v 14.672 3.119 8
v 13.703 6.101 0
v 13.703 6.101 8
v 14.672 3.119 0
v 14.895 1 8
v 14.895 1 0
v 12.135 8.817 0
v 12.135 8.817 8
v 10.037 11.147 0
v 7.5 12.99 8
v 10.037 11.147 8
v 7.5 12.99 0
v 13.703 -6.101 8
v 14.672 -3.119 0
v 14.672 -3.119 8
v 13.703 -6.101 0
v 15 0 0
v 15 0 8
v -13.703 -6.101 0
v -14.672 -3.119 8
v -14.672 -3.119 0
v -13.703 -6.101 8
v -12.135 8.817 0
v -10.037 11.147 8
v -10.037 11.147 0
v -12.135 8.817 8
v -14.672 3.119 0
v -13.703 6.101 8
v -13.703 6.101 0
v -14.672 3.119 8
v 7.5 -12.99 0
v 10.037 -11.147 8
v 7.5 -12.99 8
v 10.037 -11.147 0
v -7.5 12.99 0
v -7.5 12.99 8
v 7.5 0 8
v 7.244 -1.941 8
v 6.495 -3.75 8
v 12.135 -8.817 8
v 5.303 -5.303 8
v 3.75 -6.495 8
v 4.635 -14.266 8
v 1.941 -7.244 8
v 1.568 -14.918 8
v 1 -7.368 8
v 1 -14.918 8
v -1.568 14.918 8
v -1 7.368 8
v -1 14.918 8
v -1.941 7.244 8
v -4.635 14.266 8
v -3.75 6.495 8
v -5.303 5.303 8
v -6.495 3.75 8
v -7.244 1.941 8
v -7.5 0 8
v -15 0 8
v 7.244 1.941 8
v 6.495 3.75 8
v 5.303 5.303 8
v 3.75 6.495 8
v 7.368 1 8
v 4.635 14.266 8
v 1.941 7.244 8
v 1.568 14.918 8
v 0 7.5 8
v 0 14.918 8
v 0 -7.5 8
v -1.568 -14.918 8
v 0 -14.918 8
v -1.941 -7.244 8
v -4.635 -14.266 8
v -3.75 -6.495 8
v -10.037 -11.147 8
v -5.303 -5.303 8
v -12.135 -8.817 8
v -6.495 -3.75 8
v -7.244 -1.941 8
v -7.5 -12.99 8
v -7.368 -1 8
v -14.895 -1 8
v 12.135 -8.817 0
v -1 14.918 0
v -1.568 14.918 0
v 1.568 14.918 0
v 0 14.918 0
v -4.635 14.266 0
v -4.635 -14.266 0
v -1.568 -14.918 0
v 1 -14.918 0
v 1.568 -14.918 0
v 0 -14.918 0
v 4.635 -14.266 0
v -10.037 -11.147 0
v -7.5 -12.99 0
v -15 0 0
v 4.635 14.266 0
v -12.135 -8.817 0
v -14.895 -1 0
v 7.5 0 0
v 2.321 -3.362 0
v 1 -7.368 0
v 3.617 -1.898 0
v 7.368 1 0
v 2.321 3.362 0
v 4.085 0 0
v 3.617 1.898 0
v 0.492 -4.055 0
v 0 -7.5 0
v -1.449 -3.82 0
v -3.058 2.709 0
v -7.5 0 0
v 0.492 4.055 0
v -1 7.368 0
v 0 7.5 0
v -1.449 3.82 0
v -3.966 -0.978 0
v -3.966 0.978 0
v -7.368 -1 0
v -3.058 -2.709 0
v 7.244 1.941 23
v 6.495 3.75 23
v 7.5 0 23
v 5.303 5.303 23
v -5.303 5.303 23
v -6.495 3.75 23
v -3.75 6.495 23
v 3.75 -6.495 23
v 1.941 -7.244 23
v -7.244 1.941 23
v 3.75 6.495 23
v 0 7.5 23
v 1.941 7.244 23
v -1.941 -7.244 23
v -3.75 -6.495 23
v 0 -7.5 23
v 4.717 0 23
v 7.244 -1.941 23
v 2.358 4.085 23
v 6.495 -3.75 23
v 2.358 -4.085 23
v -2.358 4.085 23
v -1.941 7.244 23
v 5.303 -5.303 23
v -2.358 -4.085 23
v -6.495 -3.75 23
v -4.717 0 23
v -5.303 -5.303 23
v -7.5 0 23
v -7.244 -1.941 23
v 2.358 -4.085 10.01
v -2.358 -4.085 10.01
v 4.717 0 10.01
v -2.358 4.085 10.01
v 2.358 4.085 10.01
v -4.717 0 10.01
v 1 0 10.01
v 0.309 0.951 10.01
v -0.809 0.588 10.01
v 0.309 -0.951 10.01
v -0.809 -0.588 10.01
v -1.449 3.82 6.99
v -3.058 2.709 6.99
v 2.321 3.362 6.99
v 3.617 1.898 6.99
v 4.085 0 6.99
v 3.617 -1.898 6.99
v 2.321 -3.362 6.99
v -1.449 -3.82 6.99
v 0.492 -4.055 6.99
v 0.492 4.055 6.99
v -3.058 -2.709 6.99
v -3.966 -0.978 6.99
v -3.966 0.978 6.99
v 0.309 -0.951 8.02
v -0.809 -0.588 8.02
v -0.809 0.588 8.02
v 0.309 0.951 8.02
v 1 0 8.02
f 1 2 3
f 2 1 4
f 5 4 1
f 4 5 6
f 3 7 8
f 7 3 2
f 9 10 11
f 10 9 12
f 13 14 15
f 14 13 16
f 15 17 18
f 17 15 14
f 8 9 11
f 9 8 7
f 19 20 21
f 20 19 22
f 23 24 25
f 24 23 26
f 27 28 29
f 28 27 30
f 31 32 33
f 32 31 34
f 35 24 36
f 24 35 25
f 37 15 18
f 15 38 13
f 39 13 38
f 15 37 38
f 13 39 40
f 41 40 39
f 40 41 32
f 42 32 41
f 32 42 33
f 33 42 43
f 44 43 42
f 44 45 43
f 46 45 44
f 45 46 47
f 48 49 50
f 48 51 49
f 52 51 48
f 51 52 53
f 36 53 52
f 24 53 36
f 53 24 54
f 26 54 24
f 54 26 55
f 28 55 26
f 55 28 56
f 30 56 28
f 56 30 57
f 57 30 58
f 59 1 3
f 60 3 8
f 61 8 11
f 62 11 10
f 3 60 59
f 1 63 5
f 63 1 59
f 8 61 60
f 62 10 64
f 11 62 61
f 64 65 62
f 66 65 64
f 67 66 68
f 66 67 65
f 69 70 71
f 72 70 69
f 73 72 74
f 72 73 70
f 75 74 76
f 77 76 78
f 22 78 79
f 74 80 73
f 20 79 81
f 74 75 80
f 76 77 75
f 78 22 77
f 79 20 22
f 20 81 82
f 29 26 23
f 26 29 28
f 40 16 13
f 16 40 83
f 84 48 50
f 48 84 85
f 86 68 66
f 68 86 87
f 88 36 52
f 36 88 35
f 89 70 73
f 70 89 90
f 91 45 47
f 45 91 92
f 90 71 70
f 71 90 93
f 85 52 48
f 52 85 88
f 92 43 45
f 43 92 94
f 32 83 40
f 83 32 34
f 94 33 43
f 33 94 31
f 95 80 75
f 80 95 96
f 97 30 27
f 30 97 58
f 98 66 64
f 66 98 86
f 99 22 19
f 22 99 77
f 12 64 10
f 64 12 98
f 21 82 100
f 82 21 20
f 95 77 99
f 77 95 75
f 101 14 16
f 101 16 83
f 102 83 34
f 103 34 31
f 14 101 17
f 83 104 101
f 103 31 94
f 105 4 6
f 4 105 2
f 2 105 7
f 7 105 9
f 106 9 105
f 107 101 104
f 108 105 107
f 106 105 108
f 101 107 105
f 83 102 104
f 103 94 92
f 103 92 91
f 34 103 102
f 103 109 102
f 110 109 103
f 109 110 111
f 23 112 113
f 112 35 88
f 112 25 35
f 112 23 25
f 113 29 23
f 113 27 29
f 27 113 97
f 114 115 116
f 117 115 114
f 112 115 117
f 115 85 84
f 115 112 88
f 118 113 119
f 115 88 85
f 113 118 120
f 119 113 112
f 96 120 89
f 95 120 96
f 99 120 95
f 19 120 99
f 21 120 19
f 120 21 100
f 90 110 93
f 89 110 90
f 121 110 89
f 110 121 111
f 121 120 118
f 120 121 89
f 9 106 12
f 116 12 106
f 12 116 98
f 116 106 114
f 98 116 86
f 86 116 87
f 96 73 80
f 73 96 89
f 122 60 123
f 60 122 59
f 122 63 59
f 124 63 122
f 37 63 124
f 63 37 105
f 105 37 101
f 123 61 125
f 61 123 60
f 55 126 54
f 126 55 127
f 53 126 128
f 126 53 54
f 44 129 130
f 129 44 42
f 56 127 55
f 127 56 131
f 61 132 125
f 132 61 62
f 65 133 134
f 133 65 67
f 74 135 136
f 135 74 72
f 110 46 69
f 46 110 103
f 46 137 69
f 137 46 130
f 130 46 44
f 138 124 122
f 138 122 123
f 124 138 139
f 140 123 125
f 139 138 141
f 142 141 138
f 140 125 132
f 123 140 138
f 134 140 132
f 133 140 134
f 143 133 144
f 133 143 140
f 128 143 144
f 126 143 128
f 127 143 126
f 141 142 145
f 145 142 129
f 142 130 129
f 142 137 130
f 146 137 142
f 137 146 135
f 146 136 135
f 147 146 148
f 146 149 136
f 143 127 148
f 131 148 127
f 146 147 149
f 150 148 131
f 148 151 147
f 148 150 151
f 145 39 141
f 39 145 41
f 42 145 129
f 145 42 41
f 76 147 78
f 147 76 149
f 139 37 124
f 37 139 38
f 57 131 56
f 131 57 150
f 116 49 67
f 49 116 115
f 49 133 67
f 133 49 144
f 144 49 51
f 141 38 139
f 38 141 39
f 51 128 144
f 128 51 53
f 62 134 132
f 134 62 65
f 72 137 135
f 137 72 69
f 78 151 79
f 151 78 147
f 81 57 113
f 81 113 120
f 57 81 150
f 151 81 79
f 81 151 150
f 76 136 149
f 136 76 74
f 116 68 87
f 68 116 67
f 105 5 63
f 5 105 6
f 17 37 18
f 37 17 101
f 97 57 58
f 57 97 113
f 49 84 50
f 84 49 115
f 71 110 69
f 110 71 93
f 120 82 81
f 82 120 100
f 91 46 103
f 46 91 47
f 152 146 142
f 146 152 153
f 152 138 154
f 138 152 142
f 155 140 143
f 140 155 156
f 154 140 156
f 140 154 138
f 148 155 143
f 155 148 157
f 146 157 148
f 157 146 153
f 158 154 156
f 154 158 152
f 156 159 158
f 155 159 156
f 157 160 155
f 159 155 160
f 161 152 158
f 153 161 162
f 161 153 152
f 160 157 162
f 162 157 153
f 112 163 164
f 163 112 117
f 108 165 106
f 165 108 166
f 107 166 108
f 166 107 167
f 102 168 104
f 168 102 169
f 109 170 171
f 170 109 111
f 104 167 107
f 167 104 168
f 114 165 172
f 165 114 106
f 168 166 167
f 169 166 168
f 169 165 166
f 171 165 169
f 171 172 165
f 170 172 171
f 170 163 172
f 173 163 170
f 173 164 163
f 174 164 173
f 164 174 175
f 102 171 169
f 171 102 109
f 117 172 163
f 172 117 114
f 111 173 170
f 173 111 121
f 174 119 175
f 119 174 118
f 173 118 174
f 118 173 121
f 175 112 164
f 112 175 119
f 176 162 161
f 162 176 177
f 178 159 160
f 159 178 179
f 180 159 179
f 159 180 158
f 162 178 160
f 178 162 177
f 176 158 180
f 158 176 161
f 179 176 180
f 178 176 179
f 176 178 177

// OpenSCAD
/* [Global] */

// How deep should the hexagonal hole for the wheel shaft be?
shaft_pocket_len = 13; // [ 1:30 ]

// How long past the end of the shaft should the hub extend?
extension = 10; // [ 3: 40 ]

// How wide should the shaft be between flats?  ( this will require tweaking for material and printer properties )
hex_shaft_across_flats_mm = 8.17; // [ 4:80 ]

// inner hub diameter ( make it bigger than hex_shaft_across_flats_mm + 3 )
inner_hub_diameter_mm = 15; // [ 7:80 ]

// paddle hub diameter ( make it bigger than inner_hub_diameter_mm + 10 )
paddle_hub_diameter_mm = 30; // [ 13:80 ]

// paddle hub thickness ( make it bigger than hex_shaft_across_flats_mm + 10 )
paddle_hub_thickness_mm = 8; // [ 5:80 ]


// paddle slot thickness ( tweak for material + printer  )
paddle_slot_thickness_mm = 1; // [ 0.1:4 ]

// How many paddles? 
numpaddles = 4; // [ 0:24 ]


/*  [Hidden] */
screw_hole_height = 3;
tallness = shaft_pocket_len + extension;

 module cylinder_outer(height,radius,fn){
   fudge = 1/cos(180/fn);
   cylinder(h=height,r=radius*fudge,$fn=fn);
}

difference () {
    union() {
        cylinder (d=paddle_hub_diameter_mm, h=paddle_hub_thickness_mm);
        cylinder (d=inner_hub_diameter_mm, h=tallness);
    }
    translate ([0, 0, tallness - shaft_pocket_len + 0.01]) {
        cylinder_outer (height = shaft_pocket_len, radius = hex_shaft_across_flats_mm/2, fn=6); 
    }
    translate ([0, 0, -0.01])cylinder (d =hex_shaft_across_flats_mm, h = tallness -shaft_pocket_len - screw_hole_height);
    translate ([0, 0, tallness - shaft_pocket_len - screw_hole_height * 0.66])
        cylinder_outer (radius =3/2, height = screw_hole_height );
    translate ([0,0,-0.1]) difference () {
        union () {
            for (rot= [0:360/numpaddles:359]) { 
                rotate([0,0,rot]) cube([paddle_hub_diameter_mm + 0.01, paddle_slot_thickness_mm,tallness]);
            }
        }
        cylinder (d=15, h=tallness);
    }
}
